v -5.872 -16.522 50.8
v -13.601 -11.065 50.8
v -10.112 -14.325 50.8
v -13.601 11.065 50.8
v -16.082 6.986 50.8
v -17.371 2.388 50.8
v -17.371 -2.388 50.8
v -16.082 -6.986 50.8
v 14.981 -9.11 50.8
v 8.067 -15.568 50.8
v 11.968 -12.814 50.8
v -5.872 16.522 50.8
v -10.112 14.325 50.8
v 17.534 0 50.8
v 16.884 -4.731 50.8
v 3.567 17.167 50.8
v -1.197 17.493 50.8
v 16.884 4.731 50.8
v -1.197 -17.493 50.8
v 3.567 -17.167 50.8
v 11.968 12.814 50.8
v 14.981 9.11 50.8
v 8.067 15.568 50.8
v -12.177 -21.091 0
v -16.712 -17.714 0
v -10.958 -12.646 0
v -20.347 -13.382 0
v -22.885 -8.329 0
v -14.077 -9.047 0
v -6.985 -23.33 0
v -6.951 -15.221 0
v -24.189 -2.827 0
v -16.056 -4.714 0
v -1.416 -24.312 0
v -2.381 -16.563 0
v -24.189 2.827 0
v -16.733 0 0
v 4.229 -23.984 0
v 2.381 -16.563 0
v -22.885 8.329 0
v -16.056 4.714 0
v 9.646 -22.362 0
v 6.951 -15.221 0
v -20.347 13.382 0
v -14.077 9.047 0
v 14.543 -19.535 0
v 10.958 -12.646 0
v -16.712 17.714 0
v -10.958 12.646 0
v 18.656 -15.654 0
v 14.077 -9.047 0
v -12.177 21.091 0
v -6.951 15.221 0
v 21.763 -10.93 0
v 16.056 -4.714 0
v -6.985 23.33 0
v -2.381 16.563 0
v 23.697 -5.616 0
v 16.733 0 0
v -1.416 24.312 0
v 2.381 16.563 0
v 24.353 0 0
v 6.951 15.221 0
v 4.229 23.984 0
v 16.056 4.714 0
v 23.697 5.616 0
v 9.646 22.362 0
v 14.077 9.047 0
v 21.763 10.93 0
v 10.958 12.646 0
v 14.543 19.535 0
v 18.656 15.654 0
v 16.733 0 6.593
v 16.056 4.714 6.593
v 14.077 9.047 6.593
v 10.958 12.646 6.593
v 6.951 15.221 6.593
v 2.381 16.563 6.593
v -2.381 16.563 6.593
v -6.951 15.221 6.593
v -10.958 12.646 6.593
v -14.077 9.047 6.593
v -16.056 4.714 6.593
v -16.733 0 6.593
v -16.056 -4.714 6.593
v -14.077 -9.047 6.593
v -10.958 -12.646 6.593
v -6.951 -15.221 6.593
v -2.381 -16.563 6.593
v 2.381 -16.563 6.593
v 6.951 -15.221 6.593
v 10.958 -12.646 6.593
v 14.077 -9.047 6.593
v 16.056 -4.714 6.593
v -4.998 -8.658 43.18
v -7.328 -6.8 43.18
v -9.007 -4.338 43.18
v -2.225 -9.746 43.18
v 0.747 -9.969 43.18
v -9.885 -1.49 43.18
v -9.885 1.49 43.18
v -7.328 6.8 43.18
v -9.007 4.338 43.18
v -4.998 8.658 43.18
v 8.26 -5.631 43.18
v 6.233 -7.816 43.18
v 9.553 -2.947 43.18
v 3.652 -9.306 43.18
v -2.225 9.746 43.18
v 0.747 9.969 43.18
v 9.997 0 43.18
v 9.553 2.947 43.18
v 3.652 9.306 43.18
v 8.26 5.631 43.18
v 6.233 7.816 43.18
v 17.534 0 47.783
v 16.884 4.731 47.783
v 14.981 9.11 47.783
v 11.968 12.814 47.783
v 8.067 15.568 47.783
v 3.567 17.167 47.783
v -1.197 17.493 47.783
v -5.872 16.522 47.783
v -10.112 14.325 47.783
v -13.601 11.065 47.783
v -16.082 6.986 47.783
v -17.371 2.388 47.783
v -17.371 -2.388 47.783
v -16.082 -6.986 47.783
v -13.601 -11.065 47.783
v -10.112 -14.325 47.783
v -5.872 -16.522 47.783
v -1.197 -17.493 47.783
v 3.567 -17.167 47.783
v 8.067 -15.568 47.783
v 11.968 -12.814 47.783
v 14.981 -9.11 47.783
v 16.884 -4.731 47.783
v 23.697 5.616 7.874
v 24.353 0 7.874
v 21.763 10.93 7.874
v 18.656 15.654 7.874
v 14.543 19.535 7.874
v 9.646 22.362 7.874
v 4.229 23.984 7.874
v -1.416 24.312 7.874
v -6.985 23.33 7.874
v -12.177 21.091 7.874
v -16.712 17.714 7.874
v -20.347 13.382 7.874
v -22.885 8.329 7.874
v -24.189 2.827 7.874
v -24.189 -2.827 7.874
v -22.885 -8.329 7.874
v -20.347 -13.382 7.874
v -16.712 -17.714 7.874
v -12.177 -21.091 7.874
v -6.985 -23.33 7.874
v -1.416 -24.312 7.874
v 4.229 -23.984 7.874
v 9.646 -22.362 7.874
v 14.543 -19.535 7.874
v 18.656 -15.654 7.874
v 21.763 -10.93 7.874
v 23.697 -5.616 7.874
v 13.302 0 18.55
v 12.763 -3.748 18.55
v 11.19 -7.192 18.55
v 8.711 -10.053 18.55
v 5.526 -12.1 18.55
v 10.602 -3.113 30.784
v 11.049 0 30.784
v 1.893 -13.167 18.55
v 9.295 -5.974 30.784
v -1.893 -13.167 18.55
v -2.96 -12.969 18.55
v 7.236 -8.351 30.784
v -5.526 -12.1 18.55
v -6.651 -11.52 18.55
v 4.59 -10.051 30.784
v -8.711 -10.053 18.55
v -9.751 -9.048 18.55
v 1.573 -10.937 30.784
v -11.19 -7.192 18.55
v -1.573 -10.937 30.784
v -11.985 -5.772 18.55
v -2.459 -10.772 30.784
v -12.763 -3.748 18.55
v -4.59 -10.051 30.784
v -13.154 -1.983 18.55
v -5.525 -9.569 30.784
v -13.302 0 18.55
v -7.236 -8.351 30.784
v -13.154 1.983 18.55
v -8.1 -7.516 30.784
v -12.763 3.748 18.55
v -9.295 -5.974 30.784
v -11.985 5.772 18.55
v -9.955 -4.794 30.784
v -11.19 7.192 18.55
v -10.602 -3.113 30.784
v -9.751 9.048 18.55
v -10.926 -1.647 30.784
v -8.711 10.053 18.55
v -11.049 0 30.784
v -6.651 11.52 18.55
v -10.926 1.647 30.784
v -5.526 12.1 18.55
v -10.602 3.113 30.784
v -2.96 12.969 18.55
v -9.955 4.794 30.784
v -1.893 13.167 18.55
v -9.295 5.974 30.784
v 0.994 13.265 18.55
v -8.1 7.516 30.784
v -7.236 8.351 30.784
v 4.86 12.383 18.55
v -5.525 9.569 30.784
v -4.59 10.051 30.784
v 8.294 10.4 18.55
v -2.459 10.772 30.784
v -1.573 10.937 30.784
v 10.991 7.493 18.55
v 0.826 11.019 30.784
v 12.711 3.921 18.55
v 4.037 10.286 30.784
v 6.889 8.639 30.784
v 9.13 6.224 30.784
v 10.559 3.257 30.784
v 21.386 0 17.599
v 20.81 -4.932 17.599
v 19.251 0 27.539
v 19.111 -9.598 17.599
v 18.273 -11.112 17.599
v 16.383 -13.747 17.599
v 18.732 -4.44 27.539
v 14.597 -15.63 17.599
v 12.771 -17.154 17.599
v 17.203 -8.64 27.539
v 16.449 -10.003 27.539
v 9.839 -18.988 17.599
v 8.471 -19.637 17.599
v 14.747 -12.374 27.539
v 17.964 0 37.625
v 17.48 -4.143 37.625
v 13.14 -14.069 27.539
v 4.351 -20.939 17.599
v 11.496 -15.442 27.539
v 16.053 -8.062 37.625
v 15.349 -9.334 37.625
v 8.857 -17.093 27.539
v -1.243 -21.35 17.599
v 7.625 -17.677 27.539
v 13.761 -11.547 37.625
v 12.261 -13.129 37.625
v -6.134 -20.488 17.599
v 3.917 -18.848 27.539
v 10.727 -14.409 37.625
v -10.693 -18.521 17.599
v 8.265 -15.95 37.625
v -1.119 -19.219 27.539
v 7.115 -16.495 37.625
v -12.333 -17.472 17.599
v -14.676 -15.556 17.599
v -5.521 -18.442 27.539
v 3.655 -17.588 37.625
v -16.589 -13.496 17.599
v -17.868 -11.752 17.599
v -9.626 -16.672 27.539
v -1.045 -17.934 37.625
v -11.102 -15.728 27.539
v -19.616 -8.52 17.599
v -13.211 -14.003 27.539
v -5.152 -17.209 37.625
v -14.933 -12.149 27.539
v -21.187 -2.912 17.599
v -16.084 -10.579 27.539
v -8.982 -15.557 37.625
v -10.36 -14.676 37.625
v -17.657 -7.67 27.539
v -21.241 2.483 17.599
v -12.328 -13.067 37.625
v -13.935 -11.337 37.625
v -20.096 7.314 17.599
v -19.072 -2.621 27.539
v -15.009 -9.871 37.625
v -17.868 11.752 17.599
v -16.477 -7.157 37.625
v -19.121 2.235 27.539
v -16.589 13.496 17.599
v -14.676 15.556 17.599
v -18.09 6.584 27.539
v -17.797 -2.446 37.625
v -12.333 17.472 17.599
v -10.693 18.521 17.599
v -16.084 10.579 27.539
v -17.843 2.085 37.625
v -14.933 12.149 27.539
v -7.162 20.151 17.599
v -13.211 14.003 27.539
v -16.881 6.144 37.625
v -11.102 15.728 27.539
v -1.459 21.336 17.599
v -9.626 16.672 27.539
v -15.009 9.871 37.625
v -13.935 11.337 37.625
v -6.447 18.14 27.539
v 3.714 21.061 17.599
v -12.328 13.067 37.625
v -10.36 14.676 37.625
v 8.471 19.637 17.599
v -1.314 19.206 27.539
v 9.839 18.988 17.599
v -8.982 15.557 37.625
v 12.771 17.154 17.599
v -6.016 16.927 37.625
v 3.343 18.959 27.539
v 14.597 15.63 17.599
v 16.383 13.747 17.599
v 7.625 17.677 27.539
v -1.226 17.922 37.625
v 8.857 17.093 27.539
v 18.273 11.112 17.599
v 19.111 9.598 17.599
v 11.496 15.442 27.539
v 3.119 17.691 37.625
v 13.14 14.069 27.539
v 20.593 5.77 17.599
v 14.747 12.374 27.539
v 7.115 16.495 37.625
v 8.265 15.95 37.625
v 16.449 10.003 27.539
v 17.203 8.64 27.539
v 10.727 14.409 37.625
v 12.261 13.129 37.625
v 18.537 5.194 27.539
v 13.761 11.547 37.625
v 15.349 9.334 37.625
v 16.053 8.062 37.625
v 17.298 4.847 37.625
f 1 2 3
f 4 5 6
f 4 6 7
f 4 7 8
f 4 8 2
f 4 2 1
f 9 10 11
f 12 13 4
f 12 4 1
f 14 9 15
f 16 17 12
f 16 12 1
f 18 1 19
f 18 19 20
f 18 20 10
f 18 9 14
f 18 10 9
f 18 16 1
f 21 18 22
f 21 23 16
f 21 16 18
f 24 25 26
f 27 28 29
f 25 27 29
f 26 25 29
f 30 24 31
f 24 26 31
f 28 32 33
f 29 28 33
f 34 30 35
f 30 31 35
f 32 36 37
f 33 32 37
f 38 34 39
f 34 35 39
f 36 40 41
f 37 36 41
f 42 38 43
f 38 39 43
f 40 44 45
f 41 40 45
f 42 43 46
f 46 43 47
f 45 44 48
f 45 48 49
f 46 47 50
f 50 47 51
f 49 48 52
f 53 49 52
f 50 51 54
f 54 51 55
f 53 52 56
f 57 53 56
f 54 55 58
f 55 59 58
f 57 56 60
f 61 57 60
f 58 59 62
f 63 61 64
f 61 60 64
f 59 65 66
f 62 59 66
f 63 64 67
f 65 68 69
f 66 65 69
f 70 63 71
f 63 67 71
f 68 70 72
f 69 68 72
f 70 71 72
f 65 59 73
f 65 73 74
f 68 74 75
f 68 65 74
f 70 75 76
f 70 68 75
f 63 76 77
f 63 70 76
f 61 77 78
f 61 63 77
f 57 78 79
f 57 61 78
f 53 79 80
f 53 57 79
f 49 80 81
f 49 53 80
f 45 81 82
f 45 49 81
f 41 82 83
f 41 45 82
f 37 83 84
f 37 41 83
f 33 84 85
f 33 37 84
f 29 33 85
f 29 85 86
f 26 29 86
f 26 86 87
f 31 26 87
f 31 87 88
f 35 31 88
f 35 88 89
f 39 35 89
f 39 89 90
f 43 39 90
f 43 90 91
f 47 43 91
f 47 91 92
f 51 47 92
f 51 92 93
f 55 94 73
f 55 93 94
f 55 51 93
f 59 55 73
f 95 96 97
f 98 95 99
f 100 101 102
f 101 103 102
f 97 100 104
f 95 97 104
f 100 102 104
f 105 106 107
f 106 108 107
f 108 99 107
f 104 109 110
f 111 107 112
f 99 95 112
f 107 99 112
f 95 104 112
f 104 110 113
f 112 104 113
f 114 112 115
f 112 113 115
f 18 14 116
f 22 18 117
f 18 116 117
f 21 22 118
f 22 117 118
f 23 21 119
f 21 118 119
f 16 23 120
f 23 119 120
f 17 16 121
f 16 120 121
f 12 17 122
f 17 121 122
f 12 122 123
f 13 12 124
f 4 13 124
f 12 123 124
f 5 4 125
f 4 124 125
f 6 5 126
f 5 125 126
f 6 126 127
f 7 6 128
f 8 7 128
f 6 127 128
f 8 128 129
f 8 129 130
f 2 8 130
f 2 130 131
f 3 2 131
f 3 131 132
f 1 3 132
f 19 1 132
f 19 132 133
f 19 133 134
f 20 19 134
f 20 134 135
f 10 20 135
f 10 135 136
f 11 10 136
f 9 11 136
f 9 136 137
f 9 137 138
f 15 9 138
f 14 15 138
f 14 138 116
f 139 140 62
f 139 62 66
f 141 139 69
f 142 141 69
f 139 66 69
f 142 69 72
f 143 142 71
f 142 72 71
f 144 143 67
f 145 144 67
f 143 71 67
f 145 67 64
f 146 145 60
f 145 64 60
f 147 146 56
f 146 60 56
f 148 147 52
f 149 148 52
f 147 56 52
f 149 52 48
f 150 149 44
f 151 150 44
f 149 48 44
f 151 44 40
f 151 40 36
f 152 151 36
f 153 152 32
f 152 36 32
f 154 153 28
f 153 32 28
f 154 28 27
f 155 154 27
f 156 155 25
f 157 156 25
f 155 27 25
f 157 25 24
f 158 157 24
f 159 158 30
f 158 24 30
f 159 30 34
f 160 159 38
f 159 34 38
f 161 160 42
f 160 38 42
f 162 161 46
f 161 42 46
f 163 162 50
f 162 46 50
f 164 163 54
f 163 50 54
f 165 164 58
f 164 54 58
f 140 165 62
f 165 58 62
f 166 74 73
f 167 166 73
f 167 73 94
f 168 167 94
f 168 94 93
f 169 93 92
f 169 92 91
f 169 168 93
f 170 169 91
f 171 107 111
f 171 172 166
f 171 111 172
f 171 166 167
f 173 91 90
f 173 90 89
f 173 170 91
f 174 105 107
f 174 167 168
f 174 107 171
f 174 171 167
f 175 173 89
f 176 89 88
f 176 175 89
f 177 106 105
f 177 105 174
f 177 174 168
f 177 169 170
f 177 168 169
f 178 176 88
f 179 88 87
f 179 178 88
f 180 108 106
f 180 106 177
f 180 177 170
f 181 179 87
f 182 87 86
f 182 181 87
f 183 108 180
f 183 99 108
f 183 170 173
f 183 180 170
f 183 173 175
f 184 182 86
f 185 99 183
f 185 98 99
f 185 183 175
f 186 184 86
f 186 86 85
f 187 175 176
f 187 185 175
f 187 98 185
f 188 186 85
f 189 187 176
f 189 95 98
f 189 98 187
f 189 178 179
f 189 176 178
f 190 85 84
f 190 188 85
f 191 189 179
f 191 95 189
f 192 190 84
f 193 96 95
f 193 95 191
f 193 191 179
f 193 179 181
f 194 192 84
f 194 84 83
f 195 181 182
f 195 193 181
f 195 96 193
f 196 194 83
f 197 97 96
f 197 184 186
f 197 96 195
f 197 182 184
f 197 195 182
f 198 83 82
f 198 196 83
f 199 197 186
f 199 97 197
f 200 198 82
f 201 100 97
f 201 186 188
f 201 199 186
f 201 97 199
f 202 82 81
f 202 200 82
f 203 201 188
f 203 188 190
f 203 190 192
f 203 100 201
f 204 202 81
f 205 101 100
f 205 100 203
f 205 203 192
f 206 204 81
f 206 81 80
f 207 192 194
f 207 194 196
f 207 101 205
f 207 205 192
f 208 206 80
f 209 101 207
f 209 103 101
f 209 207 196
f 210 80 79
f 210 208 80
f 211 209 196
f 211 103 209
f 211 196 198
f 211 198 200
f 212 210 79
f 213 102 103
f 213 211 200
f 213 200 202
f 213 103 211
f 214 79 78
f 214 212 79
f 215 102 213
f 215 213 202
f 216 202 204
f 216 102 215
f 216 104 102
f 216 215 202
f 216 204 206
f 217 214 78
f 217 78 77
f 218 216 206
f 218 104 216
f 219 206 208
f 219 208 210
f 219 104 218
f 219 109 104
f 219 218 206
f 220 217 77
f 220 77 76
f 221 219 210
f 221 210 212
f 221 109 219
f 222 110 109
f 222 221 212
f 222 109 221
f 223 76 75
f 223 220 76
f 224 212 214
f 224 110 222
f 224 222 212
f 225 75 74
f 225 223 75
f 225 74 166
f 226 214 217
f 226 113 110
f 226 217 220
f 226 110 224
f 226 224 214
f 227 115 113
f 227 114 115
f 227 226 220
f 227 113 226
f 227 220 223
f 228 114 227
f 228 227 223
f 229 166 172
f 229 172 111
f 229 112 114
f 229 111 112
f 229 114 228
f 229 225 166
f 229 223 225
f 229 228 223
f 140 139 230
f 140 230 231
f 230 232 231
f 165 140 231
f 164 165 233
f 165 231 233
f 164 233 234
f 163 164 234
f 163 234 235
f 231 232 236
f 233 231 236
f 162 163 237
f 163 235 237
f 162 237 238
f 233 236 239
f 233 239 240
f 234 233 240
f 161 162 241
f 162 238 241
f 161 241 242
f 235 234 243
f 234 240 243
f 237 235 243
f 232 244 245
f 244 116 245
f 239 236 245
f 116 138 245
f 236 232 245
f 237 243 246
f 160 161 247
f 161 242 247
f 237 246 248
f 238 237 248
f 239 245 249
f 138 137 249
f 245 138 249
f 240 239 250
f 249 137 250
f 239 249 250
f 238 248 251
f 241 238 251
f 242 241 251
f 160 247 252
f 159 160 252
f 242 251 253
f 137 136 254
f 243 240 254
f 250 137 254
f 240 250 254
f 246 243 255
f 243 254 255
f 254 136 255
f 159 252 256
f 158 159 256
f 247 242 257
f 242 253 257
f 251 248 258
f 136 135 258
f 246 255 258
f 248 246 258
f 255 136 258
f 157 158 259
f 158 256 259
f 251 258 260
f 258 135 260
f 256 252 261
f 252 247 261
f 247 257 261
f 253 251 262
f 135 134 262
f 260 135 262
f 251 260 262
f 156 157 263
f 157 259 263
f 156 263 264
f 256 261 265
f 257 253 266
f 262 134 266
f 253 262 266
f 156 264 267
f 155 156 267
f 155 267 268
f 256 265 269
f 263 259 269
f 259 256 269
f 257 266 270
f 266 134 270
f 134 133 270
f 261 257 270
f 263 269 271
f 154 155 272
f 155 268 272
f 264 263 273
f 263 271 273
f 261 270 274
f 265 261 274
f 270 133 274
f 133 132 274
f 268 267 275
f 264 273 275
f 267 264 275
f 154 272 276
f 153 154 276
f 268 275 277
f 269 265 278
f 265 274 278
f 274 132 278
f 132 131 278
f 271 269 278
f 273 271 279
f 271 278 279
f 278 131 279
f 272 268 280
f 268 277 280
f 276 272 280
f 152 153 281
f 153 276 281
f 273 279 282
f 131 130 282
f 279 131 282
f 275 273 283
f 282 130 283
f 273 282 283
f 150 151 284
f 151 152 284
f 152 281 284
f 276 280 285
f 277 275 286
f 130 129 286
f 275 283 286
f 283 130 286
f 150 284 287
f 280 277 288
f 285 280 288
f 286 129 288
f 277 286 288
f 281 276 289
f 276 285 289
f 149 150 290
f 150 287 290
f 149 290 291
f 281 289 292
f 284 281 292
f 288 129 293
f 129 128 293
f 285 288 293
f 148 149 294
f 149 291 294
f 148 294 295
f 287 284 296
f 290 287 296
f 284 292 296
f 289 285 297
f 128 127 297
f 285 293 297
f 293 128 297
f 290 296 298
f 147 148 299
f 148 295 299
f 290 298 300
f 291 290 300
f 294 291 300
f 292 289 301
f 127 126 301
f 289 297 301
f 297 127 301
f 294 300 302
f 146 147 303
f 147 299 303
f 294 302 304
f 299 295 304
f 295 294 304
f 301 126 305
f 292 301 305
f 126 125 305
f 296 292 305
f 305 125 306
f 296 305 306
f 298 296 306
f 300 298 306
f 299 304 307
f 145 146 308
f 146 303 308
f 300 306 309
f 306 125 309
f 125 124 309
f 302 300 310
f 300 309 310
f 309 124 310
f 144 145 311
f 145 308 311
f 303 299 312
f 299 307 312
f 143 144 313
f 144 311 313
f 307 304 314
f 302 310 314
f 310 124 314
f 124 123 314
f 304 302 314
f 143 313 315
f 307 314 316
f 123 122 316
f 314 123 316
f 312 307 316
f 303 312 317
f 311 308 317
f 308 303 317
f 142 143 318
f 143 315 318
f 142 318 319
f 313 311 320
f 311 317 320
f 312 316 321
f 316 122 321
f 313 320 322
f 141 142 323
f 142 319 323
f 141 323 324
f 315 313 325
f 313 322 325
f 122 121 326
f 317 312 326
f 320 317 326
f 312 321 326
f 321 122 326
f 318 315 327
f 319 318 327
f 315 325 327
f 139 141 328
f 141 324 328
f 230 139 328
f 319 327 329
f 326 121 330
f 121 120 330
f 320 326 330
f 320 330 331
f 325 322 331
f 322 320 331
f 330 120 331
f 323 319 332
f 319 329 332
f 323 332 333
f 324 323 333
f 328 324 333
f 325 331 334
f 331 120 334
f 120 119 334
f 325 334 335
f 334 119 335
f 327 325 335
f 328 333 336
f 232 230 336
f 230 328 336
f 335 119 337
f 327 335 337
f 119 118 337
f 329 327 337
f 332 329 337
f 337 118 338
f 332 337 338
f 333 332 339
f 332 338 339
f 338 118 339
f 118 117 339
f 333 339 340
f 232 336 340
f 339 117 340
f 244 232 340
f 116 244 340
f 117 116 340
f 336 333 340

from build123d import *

# Parameters (mm, degrees)
F0_R     = 17.5339973563
F1_DEPTH = 50.8
F2_R     = 24.353495683
F3_DEPTH = 7.874
F5_T     = -7.62


# Not quite as in the source:
# - a fillet or chamfer that OpenCascade refuses, or shapes differently, is made with other operations: its cross-section is extruded or revolved along the edge and cut away or added


with BuildPart() as f1:
    # F0 (on Top) → F1 (new body)
    with BuildSketch(Plane.XY):
        Circle(F0_R)
    extrude(amount=F1_DEPTH)

    # F2 (on Top) → F3 (join)
    with BuildSketch(Plane.XY):
        Circle(F2_R)
    extrude(amount=F3_DEPTH)

    # F4: fillet of radius 120.1892079892 on 1 edges, made by hand

    # F4_s1 → F4_t2 (revolve)
    with BuildSketch(Plane.XZ):
        with BuildLine():
            ThreePointArc((24.353495683, 7.874), (19.2511383183, 27.5394411034), (17.5339973563, 47.7833303391))
            Line((17.5339973563, 47.7833303391), (17.5339973563, 7.874))
            Line((17.5339973563, 7.874), (24.353495683, 7.874))
        make_face()
    revolve(axis=Axis((0, 0, 7.874), (0, 0, -1)))

    # F5
    f5_openings = [f1.faces().sort_by_distance(p)[0] for p in [
        (0, 0, 0),
    ]]
    offset(amount=F5_T, openings=f5_openings)


solid = f1.part
